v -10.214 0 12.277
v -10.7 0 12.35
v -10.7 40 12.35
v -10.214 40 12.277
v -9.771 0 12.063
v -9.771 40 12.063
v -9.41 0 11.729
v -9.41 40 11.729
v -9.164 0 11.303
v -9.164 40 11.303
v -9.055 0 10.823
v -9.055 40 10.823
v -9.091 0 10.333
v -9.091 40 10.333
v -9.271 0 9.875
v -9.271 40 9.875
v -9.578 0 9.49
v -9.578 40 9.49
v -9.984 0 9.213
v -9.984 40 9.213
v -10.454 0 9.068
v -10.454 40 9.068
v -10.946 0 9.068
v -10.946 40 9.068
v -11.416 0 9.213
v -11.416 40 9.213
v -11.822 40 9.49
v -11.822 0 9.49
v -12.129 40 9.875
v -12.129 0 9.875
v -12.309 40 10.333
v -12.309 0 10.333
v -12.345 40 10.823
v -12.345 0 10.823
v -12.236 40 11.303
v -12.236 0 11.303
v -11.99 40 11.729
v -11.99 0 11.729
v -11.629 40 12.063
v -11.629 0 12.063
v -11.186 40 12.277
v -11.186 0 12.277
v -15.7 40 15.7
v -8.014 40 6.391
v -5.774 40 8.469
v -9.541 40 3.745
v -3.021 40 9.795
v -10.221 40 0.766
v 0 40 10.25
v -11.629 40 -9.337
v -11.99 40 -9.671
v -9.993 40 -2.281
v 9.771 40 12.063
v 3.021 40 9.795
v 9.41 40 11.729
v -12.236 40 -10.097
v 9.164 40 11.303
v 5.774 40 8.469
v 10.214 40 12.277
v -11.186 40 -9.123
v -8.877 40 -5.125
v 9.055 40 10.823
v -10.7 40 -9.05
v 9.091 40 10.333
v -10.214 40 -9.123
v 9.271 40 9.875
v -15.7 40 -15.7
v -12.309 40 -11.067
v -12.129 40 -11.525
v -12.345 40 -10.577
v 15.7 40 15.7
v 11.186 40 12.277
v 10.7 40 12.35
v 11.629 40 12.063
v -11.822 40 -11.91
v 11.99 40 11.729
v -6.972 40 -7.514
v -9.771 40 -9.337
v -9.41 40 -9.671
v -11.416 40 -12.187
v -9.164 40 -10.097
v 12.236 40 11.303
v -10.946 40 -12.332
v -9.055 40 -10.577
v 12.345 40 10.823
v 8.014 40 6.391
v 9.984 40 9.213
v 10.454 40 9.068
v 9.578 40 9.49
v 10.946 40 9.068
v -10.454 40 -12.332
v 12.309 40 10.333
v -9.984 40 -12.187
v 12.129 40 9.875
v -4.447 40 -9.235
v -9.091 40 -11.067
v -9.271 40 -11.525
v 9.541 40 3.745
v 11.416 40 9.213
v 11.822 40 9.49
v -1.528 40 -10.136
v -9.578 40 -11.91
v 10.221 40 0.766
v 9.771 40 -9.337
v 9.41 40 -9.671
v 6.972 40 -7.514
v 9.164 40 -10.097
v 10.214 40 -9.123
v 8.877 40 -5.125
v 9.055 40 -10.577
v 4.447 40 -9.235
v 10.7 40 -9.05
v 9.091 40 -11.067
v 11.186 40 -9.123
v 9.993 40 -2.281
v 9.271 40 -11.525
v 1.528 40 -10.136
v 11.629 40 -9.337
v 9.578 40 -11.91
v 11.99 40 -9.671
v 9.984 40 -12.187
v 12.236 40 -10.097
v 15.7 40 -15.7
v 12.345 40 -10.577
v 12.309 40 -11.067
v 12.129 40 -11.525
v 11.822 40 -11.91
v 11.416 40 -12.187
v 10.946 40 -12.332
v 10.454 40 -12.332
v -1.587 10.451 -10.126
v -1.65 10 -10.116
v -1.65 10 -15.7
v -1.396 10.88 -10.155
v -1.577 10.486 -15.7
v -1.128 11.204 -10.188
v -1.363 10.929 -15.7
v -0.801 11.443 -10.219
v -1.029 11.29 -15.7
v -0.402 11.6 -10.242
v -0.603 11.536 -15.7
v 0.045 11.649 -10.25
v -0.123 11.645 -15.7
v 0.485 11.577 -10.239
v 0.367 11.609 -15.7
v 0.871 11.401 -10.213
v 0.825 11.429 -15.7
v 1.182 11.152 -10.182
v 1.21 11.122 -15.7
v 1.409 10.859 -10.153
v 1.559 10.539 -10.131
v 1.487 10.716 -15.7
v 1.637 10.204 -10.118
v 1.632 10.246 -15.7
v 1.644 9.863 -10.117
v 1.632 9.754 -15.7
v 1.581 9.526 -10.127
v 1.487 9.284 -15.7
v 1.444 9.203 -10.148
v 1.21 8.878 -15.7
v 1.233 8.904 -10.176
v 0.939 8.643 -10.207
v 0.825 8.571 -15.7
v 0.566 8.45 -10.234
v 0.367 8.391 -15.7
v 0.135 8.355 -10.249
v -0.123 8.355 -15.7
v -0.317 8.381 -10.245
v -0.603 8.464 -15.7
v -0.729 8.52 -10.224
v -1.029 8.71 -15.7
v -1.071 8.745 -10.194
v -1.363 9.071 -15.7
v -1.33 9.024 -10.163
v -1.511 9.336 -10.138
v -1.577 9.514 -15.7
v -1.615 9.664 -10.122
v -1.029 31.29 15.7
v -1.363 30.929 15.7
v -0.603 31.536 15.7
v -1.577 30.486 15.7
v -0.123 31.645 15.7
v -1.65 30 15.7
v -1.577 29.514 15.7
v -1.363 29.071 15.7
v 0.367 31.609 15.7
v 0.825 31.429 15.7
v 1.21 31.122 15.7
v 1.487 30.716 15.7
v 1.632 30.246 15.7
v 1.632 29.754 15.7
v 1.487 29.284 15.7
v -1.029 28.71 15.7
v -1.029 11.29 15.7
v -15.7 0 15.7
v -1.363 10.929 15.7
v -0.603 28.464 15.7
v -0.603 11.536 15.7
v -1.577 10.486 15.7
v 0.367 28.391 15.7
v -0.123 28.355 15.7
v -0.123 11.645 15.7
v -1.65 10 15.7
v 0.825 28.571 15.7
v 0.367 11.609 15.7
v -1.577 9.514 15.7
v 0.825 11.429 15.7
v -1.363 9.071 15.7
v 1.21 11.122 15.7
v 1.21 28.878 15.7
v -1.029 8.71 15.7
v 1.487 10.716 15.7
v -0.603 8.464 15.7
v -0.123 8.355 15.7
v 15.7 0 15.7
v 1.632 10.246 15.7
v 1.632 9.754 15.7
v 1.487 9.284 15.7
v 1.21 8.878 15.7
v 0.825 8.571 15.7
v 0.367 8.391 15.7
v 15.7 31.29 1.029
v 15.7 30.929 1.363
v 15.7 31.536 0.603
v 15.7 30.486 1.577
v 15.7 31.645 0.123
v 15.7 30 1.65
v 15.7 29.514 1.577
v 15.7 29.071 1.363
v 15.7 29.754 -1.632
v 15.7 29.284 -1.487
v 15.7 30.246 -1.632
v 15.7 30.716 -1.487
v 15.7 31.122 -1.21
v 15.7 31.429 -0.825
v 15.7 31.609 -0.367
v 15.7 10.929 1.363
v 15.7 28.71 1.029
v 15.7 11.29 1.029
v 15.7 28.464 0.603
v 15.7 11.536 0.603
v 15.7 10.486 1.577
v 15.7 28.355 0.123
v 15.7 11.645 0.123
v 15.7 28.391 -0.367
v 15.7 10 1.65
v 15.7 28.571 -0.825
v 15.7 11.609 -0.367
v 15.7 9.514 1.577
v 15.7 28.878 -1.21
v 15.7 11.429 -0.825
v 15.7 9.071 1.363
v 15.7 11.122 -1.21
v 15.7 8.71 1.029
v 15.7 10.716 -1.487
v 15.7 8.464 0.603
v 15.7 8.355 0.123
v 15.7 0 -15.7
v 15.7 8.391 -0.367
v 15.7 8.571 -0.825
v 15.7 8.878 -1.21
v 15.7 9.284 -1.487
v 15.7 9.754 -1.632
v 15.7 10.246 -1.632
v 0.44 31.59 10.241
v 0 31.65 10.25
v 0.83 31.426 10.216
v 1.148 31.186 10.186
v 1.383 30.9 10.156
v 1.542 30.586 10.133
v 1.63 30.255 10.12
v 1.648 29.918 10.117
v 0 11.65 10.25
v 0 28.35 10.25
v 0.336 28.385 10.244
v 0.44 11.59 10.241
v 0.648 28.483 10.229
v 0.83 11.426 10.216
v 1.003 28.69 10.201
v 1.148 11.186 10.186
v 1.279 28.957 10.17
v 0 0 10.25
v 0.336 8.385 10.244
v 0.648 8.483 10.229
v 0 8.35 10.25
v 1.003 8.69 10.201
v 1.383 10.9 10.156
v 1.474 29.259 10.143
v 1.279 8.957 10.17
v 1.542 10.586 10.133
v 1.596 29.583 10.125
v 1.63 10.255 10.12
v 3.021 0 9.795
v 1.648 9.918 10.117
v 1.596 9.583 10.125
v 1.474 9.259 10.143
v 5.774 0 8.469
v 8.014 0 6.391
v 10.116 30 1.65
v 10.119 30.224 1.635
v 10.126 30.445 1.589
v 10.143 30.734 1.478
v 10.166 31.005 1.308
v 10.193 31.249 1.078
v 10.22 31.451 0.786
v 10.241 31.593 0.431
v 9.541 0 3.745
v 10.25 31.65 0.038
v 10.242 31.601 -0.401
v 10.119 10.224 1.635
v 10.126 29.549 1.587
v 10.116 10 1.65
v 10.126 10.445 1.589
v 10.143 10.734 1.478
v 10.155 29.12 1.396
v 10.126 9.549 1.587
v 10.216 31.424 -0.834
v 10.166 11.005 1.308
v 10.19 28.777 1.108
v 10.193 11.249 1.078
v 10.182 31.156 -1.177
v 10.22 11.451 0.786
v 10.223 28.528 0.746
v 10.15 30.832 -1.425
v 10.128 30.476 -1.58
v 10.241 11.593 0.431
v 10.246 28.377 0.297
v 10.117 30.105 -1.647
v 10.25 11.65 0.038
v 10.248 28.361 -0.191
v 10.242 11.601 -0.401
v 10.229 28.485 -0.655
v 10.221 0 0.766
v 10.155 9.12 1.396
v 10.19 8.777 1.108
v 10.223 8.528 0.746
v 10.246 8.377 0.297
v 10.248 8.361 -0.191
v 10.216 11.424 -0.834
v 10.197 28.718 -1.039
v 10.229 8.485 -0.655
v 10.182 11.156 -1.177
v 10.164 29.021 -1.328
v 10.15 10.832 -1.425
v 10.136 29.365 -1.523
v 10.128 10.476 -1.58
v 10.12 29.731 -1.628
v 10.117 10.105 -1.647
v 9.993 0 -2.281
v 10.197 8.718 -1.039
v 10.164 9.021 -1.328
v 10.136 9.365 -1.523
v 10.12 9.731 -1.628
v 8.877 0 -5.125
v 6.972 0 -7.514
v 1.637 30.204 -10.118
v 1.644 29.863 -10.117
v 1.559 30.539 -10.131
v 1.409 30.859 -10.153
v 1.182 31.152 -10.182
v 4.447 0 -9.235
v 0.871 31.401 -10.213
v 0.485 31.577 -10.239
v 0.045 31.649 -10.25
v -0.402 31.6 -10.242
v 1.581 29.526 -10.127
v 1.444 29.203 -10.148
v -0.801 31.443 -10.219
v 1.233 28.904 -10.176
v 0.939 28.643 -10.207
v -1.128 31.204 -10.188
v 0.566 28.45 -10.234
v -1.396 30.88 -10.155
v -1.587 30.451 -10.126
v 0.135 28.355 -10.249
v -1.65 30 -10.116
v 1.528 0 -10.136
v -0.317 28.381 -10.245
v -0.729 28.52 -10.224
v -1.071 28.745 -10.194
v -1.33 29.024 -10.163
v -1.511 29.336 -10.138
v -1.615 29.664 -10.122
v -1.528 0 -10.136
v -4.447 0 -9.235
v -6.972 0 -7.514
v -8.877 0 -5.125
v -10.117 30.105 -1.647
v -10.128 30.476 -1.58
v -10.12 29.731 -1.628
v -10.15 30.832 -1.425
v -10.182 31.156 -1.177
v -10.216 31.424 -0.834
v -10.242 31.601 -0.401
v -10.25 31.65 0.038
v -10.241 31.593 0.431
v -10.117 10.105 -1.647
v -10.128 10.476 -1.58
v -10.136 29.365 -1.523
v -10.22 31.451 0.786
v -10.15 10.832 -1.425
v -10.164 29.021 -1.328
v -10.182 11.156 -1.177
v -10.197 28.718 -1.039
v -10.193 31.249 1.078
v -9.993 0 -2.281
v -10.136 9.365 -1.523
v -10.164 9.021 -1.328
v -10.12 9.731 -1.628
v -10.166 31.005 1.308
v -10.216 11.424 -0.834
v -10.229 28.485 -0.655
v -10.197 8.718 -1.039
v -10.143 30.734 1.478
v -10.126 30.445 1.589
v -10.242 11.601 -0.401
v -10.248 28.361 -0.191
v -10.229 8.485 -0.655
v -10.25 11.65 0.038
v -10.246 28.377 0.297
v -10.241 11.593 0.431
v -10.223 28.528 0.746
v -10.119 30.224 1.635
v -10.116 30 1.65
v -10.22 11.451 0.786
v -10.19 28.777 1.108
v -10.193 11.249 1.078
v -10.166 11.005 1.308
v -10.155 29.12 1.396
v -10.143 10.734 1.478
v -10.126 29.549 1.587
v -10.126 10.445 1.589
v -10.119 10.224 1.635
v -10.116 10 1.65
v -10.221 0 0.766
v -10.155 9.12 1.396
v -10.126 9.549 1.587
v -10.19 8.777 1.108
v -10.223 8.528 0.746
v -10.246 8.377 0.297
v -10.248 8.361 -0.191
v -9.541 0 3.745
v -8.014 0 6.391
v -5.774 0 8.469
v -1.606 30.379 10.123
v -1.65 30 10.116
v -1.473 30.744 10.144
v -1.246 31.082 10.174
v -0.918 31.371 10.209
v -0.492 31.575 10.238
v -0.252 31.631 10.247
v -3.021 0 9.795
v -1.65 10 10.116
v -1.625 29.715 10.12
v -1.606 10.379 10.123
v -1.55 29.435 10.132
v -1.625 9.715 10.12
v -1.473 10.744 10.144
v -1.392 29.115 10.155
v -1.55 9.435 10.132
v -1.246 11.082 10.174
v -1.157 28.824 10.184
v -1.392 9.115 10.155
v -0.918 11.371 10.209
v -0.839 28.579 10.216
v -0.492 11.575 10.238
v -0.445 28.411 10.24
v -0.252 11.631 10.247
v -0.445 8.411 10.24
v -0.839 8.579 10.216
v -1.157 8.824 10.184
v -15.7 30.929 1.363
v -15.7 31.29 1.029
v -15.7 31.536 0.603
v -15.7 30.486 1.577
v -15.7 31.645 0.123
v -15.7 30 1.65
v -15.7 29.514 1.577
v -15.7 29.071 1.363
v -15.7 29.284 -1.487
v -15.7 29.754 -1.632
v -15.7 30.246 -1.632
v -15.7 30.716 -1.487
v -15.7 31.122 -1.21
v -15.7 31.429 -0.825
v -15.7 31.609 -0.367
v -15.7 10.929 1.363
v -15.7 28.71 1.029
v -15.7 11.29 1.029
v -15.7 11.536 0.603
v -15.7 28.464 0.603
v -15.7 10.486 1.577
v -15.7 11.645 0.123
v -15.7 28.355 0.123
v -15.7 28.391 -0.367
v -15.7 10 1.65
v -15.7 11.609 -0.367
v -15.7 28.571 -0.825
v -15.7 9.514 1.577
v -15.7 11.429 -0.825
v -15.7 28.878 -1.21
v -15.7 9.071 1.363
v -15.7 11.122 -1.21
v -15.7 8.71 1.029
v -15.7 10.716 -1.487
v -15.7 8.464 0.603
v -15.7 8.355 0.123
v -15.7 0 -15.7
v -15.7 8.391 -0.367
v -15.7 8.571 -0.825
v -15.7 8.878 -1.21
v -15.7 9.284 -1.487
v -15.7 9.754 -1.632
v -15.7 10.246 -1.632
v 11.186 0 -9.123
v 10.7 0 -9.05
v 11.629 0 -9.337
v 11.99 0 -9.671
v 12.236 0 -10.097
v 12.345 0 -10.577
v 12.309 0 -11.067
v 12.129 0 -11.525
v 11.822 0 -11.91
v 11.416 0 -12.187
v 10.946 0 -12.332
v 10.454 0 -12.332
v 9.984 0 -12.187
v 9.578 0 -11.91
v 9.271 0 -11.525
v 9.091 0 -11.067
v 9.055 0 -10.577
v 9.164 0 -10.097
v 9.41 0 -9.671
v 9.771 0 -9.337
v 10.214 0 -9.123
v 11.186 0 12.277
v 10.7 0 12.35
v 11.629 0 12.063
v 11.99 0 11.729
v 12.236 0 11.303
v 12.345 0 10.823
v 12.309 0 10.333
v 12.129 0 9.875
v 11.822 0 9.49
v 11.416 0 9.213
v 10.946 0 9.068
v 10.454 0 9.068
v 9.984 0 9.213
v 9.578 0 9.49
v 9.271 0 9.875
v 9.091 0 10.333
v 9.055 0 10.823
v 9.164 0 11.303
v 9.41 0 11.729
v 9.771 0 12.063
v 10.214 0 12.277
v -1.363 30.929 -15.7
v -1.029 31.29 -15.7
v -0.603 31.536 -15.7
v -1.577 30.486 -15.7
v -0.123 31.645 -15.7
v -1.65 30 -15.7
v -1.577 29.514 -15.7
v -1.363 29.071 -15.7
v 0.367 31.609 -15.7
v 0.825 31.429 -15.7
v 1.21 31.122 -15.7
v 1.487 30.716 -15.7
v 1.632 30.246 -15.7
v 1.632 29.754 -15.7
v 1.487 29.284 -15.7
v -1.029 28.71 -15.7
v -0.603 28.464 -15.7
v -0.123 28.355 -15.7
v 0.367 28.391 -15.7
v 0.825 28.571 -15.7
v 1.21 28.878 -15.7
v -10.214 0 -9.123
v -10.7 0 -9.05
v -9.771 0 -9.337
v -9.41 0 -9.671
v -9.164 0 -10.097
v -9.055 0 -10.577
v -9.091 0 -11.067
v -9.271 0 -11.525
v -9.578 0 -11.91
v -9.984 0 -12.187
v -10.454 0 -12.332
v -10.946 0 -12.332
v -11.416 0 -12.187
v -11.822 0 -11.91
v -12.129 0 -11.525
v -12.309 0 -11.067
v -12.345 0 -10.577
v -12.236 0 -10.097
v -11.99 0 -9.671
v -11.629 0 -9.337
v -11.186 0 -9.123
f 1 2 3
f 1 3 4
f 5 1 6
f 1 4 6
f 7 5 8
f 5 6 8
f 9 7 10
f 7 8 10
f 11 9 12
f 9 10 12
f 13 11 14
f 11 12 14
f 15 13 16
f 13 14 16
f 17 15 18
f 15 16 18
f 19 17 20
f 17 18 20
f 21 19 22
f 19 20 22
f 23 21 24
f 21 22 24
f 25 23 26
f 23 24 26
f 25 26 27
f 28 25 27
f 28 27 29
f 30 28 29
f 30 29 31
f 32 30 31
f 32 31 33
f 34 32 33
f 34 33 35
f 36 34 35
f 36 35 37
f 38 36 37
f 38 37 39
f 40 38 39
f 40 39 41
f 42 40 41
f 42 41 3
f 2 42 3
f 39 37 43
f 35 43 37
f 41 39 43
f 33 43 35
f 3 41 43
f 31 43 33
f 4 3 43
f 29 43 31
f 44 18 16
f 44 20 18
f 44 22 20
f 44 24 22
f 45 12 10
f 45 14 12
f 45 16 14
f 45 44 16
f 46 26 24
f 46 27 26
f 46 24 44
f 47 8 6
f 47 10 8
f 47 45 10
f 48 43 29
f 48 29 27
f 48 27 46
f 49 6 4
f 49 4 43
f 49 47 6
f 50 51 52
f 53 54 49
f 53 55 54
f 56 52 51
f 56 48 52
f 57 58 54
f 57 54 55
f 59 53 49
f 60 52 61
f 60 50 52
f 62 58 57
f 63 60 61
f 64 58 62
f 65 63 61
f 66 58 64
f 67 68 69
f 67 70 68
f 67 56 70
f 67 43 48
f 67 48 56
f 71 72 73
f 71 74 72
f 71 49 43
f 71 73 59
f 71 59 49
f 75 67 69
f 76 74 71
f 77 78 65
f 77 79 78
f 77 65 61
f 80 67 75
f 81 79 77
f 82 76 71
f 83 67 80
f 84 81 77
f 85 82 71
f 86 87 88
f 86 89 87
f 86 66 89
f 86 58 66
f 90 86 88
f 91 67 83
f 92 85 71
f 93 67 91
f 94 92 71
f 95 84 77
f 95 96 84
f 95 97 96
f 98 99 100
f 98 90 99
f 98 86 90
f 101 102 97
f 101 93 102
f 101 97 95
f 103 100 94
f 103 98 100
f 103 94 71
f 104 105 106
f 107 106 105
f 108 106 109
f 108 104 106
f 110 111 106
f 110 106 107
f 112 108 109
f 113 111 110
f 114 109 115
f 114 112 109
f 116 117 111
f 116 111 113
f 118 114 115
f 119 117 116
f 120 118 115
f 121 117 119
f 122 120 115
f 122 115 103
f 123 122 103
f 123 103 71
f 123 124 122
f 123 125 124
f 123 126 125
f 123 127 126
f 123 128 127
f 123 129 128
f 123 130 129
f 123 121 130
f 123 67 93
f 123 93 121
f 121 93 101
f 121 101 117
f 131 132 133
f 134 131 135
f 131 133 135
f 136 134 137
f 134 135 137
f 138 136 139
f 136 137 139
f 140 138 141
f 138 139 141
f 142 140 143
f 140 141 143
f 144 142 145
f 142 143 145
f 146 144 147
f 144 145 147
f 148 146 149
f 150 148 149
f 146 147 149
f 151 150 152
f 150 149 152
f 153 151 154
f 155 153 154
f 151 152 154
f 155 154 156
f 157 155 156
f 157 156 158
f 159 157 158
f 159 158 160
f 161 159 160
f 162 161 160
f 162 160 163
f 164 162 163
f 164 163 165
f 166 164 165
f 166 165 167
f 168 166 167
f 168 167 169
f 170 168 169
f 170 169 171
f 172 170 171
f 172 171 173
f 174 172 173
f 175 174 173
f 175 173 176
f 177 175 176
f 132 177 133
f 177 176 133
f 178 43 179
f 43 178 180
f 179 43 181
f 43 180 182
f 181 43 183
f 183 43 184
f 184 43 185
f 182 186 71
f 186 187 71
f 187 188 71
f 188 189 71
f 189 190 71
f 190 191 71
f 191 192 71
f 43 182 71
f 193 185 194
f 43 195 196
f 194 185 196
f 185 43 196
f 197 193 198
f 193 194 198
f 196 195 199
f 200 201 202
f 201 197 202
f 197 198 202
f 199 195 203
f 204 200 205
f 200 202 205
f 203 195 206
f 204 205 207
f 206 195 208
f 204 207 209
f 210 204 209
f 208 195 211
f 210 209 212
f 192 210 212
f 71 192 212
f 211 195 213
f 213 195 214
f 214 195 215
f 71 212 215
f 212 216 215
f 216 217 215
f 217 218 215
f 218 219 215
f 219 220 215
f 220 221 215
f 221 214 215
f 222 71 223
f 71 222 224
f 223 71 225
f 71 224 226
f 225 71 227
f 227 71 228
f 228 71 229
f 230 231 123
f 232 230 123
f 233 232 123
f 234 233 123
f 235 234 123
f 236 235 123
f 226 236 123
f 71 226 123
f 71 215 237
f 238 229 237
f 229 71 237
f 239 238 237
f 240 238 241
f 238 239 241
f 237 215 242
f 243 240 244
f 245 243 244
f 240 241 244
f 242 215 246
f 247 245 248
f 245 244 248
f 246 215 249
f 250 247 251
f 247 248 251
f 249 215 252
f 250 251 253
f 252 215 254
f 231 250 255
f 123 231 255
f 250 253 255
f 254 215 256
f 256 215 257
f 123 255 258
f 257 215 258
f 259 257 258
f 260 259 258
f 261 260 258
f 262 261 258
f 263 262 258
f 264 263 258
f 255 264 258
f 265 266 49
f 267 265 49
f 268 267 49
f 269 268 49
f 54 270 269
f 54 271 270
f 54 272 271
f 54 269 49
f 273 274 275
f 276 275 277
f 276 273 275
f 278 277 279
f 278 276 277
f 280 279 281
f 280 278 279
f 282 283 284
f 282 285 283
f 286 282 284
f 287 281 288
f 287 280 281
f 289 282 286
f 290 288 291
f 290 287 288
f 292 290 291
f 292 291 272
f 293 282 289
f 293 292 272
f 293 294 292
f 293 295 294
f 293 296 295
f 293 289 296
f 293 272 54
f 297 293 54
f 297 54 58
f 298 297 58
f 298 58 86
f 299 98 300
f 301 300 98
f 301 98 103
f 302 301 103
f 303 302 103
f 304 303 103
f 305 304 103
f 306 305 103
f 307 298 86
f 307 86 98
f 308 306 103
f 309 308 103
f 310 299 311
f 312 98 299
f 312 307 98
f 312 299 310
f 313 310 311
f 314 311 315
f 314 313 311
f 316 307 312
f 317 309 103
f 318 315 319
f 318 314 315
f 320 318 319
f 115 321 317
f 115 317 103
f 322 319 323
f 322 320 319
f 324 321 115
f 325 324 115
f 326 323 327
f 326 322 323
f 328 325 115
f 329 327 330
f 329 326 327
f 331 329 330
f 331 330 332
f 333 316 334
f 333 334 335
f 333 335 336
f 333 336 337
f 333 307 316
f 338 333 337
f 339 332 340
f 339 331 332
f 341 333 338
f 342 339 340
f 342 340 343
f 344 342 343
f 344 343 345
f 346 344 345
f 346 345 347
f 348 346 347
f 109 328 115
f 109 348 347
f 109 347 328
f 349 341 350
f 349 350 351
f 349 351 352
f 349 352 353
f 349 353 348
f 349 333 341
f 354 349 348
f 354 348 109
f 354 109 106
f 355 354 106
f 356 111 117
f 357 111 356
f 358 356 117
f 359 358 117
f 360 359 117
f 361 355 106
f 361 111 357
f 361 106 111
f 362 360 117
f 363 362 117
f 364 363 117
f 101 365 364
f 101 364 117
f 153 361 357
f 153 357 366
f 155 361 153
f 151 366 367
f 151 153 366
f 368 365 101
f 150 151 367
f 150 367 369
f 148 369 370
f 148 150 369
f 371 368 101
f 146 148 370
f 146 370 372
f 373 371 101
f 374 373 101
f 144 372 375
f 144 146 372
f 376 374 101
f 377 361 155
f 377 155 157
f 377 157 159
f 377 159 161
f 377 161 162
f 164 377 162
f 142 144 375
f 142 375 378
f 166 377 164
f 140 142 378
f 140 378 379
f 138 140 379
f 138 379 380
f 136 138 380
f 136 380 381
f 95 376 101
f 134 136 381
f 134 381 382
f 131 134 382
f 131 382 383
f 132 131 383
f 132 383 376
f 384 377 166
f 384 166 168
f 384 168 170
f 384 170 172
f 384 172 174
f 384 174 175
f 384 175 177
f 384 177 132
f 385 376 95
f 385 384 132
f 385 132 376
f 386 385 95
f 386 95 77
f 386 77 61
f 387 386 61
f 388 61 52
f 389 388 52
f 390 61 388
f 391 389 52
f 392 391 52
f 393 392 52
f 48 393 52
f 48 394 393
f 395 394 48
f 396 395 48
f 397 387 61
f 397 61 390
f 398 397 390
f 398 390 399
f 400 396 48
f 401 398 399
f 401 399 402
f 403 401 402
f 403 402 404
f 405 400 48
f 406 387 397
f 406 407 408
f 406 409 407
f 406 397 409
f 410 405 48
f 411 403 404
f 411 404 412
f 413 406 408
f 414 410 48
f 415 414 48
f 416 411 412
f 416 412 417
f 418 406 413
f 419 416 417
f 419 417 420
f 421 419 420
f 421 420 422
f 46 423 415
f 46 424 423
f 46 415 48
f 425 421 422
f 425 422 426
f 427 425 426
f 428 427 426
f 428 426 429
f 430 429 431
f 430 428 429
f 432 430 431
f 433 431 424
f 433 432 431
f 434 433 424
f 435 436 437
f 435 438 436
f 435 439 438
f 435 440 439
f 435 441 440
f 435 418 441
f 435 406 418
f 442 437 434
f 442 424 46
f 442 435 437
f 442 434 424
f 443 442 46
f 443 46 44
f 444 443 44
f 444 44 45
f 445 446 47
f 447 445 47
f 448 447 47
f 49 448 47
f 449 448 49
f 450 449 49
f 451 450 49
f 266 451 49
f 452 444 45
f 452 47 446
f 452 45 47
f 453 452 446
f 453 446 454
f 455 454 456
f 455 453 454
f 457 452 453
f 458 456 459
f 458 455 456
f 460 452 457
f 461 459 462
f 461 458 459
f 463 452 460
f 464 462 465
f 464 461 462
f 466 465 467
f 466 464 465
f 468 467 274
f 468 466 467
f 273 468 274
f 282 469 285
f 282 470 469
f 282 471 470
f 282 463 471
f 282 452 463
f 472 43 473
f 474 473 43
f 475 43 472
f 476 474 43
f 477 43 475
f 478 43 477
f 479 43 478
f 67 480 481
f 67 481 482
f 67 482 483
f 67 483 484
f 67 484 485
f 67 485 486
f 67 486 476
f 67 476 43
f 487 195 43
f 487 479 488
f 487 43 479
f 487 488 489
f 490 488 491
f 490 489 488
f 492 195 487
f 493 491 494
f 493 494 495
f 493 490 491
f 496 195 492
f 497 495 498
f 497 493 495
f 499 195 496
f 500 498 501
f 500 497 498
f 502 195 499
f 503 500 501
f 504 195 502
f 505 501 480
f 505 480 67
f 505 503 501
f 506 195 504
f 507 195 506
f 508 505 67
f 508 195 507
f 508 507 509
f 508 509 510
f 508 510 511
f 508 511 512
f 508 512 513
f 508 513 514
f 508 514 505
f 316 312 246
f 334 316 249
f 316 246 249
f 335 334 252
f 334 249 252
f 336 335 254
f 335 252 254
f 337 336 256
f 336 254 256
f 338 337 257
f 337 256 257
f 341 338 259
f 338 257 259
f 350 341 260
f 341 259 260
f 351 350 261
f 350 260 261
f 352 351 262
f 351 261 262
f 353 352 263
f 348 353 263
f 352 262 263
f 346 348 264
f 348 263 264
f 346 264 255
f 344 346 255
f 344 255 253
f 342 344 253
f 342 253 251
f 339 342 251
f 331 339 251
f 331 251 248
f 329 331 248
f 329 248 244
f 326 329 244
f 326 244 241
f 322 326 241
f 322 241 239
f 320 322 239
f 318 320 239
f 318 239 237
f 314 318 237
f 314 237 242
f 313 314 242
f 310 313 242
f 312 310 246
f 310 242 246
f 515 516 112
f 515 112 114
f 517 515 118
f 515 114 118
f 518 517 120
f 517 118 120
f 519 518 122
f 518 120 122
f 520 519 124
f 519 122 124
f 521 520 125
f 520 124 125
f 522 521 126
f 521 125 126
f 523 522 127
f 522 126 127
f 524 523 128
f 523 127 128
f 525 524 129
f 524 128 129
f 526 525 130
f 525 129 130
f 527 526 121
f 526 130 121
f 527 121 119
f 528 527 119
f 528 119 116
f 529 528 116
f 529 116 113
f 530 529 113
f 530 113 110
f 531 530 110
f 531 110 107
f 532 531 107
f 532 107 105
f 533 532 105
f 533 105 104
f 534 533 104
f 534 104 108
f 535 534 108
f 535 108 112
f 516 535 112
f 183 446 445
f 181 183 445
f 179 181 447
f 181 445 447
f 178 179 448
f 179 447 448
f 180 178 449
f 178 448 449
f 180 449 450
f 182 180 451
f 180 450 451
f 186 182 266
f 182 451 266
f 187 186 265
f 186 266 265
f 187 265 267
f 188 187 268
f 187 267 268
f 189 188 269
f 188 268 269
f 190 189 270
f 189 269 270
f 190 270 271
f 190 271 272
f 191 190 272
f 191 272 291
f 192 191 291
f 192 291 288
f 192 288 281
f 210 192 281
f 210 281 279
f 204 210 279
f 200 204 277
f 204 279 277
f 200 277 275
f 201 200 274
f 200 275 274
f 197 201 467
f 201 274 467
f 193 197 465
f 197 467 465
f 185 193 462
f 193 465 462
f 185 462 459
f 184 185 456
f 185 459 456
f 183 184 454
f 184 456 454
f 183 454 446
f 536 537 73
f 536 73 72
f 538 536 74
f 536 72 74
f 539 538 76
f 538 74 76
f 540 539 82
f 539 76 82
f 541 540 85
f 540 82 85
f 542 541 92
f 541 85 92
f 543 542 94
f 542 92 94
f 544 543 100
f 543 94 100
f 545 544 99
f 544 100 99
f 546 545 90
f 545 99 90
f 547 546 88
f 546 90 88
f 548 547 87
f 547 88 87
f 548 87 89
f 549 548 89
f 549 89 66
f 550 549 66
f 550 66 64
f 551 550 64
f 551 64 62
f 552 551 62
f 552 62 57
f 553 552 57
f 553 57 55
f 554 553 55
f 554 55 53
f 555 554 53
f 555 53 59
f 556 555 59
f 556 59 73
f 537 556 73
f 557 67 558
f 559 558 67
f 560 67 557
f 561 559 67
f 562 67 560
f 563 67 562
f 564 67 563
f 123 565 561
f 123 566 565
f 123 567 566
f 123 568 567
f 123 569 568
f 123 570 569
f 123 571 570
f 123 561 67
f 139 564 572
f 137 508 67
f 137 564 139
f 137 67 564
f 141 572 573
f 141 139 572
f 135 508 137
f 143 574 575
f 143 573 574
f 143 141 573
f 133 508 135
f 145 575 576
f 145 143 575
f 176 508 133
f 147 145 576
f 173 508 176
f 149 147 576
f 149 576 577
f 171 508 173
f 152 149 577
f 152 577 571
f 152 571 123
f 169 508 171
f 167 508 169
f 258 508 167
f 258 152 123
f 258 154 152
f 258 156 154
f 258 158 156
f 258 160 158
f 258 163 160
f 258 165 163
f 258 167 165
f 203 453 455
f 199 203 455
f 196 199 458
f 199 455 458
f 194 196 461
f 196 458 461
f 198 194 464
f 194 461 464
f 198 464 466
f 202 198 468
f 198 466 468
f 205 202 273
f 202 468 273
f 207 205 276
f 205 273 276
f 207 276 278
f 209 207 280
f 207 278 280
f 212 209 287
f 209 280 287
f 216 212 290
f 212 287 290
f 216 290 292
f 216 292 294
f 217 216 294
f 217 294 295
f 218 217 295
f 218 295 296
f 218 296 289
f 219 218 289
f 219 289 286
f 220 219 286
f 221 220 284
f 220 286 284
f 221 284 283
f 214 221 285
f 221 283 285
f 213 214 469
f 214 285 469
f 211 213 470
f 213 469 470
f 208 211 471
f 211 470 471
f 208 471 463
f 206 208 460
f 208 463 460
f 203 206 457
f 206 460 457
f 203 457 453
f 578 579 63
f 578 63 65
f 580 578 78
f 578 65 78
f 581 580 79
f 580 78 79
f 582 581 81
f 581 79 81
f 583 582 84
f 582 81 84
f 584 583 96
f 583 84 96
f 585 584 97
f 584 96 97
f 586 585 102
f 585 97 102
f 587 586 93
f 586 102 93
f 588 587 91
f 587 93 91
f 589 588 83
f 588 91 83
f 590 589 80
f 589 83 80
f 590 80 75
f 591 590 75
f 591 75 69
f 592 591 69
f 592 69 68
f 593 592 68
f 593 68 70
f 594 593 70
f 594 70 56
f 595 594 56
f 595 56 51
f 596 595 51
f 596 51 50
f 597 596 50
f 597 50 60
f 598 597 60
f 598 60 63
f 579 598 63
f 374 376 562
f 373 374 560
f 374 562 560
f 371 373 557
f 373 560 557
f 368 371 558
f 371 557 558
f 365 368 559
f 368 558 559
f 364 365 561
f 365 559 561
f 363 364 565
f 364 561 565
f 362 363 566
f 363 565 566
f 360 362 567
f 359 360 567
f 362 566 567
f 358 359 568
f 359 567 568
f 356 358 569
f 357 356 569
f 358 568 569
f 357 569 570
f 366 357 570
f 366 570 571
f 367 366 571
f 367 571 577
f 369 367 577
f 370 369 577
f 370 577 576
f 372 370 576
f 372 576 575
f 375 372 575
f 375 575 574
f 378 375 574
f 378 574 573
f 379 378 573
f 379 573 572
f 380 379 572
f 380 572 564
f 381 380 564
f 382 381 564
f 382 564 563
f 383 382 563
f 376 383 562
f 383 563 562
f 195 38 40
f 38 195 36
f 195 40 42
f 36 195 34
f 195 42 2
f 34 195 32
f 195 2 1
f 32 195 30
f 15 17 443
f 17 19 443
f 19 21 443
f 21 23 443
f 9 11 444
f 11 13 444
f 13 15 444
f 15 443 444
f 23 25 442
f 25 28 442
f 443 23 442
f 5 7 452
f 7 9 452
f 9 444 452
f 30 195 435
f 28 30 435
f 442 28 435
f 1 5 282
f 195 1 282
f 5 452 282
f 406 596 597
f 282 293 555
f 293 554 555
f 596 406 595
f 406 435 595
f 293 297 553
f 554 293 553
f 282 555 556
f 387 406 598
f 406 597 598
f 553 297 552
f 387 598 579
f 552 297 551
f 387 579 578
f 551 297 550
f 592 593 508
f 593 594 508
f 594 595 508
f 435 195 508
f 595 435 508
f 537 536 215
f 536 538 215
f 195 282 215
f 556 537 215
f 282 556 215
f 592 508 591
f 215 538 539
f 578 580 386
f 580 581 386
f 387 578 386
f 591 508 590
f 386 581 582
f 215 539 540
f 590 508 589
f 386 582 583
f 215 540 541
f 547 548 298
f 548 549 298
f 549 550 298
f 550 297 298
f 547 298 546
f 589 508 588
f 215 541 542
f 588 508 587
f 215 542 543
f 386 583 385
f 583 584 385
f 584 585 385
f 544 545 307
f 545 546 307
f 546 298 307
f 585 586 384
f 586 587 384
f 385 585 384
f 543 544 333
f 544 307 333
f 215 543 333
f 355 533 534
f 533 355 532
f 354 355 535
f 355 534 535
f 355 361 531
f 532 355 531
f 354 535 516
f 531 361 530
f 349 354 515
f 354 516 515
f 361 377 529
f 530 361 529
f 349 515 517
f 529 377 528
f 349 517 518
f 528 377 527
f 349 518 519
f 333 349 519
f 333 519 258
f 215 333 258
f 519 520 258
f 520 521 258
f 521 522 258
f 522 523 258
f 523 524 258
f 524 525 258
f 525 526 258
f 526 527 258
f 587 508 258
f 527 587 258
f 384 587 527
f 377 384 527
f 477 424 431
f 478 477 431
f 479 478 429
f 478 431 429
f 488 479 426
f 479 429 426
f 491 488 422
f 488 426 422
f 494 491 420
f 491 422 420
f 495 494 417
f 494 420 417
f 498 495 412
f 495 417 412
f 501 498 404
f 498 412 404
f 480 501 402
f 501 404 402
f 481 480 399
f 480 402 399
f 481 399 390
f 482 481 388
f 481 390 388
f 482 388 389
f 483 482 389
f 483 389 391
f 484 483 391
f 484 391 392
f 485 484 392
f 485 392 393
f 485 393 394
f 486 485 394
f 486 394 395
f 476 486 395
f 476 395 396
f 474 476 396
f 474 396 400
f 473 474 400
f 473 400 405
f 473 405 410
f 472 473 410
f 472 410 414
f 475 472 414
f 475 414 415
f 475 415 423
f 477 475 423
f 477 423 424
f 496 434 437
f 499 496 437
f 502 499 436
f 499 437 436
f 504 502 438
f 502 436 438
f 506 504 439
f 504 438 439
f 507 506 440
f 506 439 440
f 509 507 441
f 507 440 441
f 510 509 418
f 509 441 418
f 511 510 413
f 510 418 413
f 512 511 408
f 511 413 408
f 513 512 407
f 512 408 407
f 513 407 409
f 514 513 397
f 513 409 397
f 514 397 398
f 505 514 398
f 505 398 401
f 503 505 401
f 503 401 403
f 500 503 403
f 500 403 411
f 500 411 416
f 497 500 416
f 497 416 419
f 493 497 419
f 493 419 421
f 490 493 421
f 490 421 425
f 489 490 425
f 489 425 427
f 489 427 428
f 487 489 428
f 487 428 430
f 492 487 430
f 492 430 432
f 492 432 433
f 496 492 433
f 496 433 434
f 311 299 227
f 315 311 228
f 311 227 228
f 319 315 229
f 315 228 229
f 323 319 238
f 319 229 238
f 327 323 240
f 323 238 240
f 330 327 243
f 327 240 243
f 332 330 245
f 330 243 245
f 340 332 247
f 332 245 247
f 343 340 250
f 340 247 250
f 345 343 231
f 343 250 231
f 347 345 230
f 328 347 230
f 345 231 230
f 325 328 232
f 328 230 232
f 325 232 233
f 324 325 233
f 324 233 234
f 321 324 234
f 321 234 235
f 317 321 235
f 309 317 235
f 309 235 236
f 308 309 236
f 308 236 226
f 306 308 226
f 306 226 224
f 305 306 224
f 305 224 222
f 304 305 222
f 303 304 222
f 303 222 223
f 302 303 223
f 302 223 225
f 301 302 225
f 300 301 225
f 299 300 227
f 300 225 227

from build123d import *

# Parameters (mm, degrees)
SKETCH1_W                       = 31.4
SKETCH1_H                       = 31.4
SKETCH1_R                       = 10.25
BOSS_EXTRUDE1_DEPTH             = 40
SKETCH2_R                       = 1.5
CUT_EXTRUDE1_DEPTH              = 40
M4_TAPPED_HOLE1_D               = 3.3
M4_TAPPED_HOLE1_DEPTH           = 10.1
M4_TAPPED_HOLE1_TIP             = 0.991420021
M4_TAPPED_HOLE1_ON_FACE_2_D     = 3.3
M4_TAPPED_HOLE1_ON_FACE_2_DEPTH = 10.1
M4_TAPPED_HOLE1_ON_FACE_2_TIP   = 0.991420021
SKETCH5_R                       = 1.5
CUT_EXTRUDE2_DEPTH              = 40
M4_TAPPED_HOLE2_D               = 3.3
M4_TAPPED_HOLE2_DEPTH           = 10.1
M4_TAPPED_HOLE2_TIP             = 0.991420021
M4_TAPPED_HOLE2_ON_FACE_2_D     = 3.3
M4_TAPPED_HOLE2_ON_FACE_2_DEPTH = 10.1
M4_TAPPED_HOLE2_ON_FACE_2_TIP   = 0.991420021
SKETCH8_R                       = 1.5
CUT_EXTRUDE3_DEPTH              = 30
M4_TAPPED_HOLE3_D               = 3.3
M4_TAPPED_HOLE3_DEPTH           = 52.1
M4_TAPPED_HOLE3_TIP             = 0.991420021


with BuildPart() as part:
    # Sketch1 → Boss-Extrude1 (new body)
    with BuildSketch(Plane(origin=(0, 0, 0), x_dir=(1, 0, 0), z_dir=(0, 1, 0))):
        Rectangle(SKETCH1_W, SKETCH1_H)
        with Locations(Location((0, 0, 0), (0, 0, 270))):
            Circle(SKETCH1_R, mode=Mode.SUBTRACT)
    extrude(amount=BOSS_EXTRUDE1_DEPTH)

    # Sketch2 → Cut-Extrude1 (cut)
    with BuildSketch(Plane(origin=(15.7, 0, 0), x_dir=(0, 0, -1), z_dir=(1, 0, 0))):
        with Locations((0, 30)):
            Circle(SKETCH2_R)
        with Locations((0, 10)):
            Circle(SKETCH2_R)
    extrude(amount=-CUT_EXTRUDE1_DEPTH, mode=Mode.SUBTRACT)

    # M4 Tapped Hole1
    with Locations(Plane(origin=(-15.7, 10, 0), x_dir=(0, 0, -1), z_dir=(-1, 0, 0))):
        with Locations((0, 0), (0, -20)):
            Hole(M4_TAPPED_HOLE1_D / 2, depth=M4_TAPPED_HOLE1_DEPTH)
            with Locations((0, 0, -(M4_TAPPED_HOLE1_DEPTH + M4_TAPPED_HOLE1_TIP / 2))):  # 118° drill point
                Cone(0, M4_TAPPED_HOLE1_D / 2, M4_TAPPED_HOLE1_TIP, mode=Mode.SUBTRACT)

    # M4 Tapped Hole1 on face 2
    with Locations(Plane(origin=(15.7, 30, 0), x_dir=(0, 0, -1), z_dir=(-1, 0, 0))):
        with Locations((0, 0), (0, 20)):
            Hole(M4_TAPPED_HOLE1_ON_FACE_2_D / 2, depth=M4_TAPPED_HOLE1_ON_FACE_2_DEPTH)
            with Locations((0, 0, -(M4_TAPPED_HOLE1_ON_FACE_2_DEPTH + M4_TAPPED_HOLE1_ON_FACE_2_TIP / 2))):  # 118° drill point
                Cone(0, M4_TAPPED_HOLE1_ON_FACE_2_D / 2, M4_TAPPED_HOLE1_ON_FACE_2_TIP, mode=Mode.SUBTRACT)

    # Sketch5 → Cut-Extrude2 (cut)
    with BuildSketch(Plane.XY.offset(15.7)):
        with Locations((0, 30)):
            Circle(SKETCH5_R)
        with Locations((0, 10)):
            Circle(SKETCH5_R)
    extrude(amount=-CUT_EXTRUDE2_DEPTH, mode=Mode.SUBTRACT)

    # M4 Tapped Hole2
    with Locations(Plane(origin=(0, 30, 15.7), x_dir=(1, 0, 0), z_dir=(0, 0, 1))):
        with Locations((0, 0), (0, -20)):
            Hole(M4_TAPPED_HOLE2_D / 2, depth=M4_TAPPED_HOLE2_DEPTH)
            with Locations((0, 0, -(M4_TAPPED_HOLE2_DEPTH + M4_TAPPED_HOLE2_TIP / 2))):  # 118° drill point
                Cone(0, M4_TAPPED_HOLE2_D / 2, M4_TAPPED_HOLE2_TIP, mode=Mode.SUBTRACT)

    # M4 Tapped Hole2 on face 2
    with Locations(Plane(origin=(0, 30, -15.7), x_dir=(1, 0, 0), z_dir=(0, 0, 1))):
        with Locations((0, 0), (0, -20)):
            Hole(M4_TAPPED_HOLE2_ON_FACE_2_D / 2, depth=M4_TAPPED_HOLE2_ON_FACE_2_DEPTH)
            with Locations((0, 0, -(M4_TAPPED_HOLE2_ON_FACE_2_DEPTH + M4_TAPPED_HOLE2_ON_FACE_2_TIP / 2))):  # 118° drill point
                Cone(0, M4_TAPPED_HOLE2_ON_FACE_2_D / 2, M4_TAPPED_HOLE2_ON_FACE_2_TIP, mode=Mode.SUBTRACT)

    # Sketch8 → Cut-Extrude3 (cut)
    with BuildSketch(Plane.XZ):
        with Locations(Location((-10.7, 10.7, 0), (0, 0, 270))):
            Circle(SKETCH8_R)
        with Locations(Location((10.7, 10.7, 0), (0, 0, 90))):
            Circle(SKETCH8_R)
        with Locations(Location((10.7, -10.7, 0), (0, 0, 270))):
            Circle(SKETCH8_R)
        with Locations(Location((-10.7, -10.7, 0), (0, 0, 90))):
            Circle(SKETCH8_R)
    extrude(amount=-CUT_EXTRUDE3_DEPTH, mode=Mode.SUBTRACT)

    # M4 Tapped Hole3
    with Locations(Plane(origin=(-10.7, 0, 10.7), x_dir=(0, 0, -1), z_dir=(0, -1, 0))):
        with Locations((0, 0), (0, 21.4), (21.4, 21.4), (21.4, 0)):
            Hole(M4_TAPPED_HOLE3_D / 2, depth=M4_TAPPED_HOLE3_DEPTH)
            with Locations((0, 0, -(M4_TAPPED_HOLE3_DEPTH + M4_TAPPED_HOLE3_TIP / 2))):  # 118° drill point
                Cone(0, M4_TAPPED_HOLE3_D / 2, M4_TAPPED_HOLE3_TIP, mode=Mode.SUBTRACT)


solid = part.part
